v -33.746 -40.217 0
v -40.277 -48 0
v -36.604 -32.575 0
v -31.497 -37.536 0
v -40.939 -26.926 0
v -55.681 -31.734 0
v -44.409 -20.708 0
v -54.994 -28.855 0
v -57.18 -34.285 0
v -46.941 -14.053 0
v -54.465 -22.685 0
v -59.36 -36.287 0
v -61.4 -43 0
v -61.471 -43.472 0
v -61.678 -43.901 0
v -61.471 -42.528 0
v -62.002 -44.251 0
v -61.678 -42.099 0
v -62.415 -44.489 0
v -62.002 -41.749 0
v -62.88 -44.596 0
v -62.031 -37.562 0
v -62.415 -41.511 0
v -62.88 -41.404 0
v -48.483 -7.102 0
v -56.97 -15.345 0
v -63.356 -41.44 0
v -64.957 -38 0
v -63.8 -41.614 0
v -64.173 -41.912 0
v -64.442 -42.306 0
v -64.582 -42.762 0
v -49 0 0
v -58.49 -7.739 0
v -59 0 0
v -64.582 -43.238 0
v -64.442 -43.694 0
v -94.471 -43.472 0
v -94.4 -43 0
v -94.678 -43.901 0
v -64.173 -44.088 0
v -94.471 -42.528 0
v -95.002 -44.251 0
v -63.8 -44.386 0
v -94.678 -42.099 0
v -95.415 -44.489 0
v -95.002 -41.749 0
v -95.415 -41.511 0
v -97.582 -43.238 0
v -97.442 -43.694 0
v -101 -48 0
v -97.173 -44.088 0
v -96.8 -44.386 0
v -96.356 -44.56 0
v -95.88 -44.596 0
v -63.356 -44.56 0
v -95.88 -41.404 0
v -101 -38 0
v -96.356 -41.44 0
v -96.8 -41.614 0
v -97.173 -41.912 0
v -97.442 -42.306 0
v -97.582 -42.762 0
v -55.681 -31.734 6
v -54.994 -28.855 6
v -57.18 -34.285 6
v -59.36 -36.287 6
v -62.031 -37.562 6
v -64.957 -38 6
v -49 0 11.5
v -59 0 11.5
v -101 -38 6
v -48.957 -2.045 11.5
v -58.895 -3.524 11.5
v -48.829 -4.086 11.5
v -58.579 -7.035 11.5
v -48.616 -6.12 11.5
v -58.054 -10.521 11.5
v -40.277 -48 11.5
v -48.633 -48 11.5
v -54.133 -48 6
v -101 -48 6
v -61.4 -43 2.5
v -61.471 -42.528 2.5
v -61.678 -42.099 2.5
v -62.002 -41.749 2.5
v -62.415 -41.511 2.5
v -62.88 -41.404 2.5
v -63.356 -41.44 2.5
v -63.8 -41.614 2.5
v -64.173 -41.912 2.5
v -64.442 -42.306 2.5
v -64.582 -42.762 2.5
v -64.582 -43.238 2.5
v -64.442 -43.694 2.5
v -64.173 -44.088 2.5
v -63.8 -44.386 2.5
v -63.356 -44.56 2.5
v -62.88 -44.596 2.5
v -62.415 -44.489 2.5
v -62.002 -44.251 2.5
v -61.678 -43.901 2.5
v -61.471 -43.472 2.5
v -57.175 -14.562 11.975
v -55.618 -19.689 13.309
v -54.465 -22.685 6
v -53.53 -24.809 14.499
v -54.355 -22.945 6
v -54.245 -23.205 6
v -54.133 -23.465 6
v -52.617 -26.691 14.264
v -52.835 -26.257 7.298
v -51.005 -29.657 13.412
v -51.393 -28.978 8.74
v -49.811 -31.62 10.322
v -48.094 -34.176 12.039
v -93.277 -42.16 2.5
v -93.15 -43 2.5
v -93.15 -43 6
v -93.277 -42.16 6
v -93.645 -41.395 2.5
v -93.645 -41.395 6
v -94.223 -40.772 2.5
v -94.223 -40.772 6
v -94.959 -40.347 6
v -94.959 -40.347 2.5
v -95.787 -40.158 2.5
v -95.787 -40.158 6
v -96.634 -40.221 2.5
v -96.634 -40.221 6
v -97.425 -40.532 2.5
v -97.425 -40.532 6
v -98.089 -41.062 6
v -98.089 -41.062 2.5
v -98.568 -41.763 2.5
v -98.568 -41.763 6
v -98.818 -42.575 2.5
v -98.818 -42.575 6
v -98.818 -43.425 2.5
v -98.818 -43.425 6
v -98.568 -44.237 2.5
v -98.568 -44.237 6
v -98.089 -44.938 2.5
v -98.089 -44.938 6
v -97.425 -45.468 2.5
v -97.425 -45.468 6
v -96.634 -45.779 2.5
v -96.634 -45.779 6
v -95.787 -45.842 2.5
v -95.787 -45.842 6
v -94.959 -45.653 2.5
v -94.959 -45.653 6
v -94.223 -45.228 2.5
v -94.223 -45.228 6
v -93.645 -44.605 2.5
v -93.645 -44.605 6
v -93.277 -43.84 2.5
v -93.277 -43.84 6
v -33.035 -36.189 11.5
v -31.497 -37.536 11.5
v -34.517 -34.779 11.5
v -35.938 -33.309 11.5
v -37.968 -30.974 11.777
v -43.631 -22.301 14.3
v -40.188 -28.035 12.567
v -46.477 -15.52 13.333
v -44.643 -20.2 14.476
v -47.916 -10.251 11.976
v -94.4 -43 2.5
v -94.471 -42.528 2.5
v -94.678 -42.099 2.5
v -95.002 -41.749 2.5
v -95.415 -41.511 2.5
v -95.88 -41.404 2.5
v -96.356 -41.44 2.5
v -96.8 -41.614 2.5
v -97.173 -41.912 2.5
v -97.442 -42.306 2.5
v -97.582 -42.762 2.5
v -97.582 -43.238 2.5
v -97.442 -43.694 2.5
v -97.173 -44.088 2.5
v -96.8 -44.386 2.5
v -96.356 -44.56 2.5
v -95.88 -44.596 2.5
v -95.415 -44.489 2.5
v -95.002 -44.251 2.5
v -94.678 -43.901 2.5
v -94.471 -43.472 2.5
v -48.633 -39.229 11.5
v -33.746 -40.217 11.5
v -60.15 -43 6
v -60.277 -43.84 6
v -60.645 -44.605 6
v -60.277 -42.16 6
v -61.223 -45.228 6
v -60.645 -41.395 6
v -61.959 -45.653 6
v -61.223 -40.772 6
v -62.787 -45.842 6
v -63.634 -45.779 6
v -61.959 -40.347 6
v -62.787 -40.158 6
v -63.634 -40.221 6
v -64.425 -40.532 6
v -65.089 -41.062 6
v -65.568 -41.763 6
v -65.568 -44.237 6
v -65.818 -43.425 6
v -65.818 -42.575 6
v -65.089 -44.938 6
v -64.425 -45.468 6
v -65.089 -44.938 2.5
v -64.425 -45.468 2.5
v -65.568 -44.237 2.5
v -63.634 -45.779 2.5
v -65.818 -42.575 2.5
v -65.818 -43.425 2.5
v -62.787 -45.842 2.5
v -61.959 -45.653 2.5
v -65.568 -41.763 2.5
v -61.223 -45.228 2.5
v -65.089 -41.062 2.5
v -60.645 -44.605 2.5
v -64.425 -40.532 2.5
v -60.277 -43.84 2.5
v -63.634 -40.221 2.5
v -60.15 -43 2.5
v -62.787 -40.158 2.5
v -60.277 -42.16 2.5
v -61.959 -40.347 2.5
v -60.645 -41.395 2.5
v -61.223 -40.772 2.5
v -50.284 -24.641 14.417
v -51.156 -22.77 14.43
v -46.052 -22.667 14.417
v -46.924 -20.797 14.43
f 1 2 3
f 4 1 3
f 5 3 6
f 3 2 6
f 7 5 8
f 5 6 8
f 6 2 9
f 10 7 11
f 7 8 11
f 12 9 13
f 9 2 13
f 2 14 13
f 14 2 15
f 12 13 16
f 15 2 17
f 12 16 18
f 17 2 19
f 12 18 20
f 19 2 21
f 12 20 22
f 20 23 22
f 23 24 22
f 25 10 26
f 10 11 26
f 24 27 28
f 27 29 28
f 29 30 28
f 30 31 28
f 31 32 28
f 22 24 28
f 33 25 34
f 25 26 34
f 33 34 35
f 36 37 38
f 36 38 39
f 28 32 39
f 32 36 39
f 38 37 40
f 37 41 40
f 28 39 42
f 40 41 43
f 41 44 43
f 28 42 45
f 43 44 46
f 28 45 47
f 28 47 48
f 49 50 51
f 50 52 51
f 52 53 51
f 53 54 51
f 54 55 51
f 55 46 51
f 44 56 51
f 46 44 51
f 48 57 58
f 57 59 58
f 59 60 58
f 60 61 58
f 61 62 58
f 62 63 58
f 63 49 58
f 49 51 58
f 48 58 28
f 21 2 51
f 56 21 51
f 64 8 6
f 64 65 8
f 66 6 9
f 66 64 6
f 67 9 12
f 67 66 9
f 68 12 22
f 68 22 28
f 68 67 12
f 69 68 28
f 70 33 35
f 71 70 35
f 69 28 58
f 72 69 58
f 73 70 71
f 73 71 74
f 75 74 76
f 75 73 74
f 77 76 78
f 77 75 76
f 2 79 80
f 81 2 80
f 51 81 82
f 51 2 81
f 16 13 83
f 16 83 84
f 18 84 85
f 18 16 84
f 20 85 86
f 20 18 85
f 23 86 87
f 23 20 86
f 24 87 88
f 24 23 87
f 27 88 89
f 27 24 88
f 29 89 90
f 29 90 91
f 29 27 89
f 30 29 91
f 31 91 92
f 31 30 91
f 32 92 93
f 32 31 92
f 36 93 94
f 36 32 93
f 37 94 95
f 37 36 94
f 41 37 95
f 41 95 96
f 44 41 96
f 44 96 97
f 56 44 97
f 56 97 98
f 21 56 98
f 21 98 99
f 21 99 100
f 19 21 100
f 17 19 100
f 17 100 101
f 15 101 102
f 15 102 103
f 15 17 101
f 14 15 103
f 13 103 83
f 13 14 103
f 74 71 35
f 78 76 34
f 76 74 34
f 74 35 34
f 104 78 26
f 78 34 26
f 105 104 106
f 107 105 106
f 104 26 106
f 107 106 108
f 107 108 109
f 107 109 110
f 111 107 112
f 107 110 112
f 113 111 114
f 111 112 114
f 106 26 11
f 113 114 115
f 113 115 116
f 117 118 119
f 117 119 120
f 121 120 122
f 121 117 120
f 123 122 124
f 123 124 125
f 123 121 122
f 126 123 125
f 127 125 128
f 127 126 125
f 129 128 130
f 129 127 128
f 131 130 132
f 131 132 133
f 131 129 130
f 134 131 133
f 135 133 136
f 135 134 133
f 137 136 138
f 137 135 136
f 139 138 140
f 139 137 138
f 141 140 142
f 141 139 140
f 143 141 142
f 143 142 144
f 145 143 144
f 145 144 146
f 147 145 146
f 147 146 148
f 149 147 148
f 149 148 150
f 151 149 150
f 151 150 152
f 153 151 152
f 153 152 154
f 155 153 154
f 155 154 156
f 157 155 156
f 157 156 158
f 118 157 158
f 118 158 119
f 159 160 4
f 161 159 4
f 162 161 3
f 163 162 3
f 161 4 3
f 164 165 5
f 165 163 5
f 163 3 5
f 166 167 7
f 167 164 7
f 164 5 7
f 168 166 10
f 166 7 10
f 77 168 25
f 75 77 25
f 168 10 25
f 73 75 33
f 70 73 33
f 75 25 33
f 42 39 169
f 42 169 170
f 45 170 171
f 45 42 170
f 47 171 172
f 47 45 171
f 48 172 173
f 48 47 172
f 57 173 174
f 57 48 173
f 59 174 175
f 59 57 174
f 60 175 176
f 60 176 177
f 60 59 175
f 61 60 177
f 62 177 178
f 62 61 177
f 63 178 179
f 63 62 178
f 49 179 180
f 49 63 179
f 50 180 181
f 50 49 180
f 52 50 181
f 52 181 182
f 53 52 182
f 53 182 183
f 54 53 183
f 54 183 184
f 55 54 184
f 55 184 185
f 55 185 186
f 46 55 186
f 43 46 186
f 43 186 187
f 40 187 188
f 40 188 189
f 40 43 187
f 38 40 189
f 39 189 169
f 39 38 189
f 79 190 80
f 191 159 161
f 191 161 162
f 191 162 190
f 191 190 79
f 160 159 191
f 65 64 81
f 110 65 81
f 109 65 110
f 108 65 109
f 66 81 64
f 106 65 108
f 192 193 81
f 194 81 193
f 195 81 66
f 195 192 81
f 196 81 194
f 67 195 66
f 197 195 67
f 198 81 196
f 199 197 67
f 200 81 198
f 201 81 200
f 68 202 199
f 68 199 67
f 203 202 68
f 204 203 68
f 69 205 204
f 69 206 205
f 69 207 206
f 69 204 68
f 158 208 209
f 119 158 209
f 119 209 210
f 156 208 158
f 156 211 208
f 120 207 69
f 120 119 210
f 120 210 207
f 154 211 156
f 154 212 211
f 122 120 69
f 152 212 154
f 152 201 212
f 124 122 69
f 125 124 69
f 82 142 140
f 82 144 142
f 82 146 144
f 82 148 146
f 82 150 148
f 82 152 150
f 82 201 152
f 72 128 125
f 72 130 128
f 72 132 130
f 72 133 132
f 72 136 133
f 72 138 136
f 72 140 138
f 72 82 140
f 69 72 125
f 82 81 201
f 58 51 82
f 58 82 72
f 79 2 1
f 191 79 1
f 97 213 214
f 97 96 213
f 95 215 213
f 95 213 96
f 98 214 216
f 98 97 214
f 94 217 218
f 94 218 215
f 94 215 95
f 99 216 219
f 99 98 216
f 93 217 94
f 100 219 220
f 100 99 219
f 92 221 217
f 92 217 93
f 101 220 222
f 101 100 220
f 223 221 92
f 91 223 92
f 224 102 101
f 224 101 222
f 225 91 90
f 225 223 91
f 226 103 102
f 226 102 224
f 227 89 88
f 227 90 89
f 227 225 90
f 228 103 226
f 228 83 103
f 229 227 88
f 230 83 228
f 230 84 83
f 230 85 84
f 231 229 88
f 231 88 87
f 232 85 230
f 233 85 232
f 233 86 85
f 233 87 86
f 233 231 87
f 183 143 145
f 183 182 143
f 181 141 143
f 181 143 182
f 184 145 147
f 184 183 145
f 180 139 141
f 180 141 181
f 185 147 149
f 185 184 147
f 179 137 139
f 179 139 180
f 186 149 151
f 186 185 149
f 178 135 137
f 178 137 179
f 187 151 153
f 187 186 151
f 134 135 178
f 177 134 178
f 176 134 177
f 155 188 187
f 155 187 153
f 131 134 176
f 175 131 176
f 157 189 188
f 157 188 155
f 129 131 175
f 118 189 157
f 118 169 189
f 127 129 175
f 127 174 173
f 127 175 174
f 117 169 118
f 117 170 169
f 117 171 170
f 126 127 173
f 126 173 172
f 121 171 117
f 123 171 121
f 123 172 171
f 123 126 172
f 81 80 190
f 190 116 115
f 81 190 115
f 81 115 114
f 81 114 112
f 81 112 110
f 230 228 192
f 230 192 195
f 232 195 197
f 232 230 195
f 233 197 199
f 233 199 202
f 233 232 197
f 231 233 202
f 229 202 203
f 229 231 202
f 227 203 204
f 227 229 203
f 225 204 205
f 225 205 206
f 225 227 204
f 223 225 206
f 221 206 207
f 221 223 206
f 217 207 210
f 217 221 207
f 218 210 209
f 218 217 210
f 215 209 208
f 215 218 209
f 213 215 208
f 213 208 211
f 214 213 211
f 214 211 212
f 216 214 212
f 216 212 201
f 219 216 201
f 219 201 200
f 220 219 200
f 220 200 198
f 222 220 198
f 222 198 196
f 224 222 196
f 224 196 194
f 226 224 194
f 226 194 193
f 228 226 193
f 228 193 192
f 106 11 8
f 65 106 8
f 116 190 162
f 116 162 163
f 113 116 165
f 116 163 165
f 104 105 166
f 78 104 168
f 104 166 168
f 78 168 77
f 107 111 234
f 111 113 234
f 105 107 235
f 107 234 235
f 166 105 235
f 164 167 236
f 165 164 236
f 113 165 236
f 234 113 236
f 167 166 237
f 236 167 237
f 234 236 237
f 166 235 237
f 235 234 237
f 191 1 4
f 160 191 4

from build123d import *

# Parameters (mm, degrees)
BOSS_EXTRUDE1_DEPTH = 16
SKETCH1_3_W         = 10
SKETCH1_3_H         = 55.866863614
SKETCH1_3_R         = 2.85
BOSS_EXTRUDE2_DEPTH = 6
SKETCH1_4_R         = 2.85
SKETCH1_4_R_2       = 1.6
BOSS_EXTRUDE3_DEPTH = 2.5
CHAMFER3_SIZE       = 10.645574538
CHAMFER4_SIZE       = 9
CUT_EXTRUDE2_DEPTH  = 27.5
FILLET1_R           = 10


with BuildPart() as part:
    # Sketch1 → Boss-Extrude1 (new body)
    with BuildSketch(Plane(origin=(0, 0, 0), x_dir=(0, 1, 0), z_dir=(0, 0, 1))):
        with BuildLine():
            Line((-40.217333264, 33.746349509), (-37.536177713, 31.496592875))
            ThreePointArc((-37.536177713, 31.496592875), (-20.708294825, 44.409081565), (0, 49))
            Line((0, 49), (0, 52.5))
            Line((0, 52.5), (0, 59))
            ThreePointArc((0, 59), (-20.225540206, 55.42497202), (-38, 45.133136386))
            Line((-38, 45.133136386), (-48, 45.133136386))
            Line((-48, 45.133136386), (-48, 40.276782297))
            Line((-48, 40.276782297), (-40.217333264, 33.746349509))
        make_face()
    extrude(amount=BOSS_EXTRUDE1_DEPTH)

    # Sketch1<3> → Boss-Extrude2 (add)
    with BuildSketch(Plane(origin=(0, 0, 0), x_dir=(0, 1, 0), z_dir=(0, 0, 1))):
        with Locations((-43, 73.066568193)):
            Rectangle(SKETCH1_3_W, SKETCH1_3_H)
        with Locations(Location((-43, 96, 0), (0, 0, 270))):
            Circle(SKETCH1_3_R, mode=Mode.SUBTRACT)
        with Locations(Location((-43, 63, 0), (0, 0, 270))):
            Circle(SKETCH1_3_R, mode=Mode.SUBTRACT)
    extrude(amount=BOSS_EXTRUDE2_DEPTH)

    # Sketch1<4> → Boss-Extrude3 (add)
    # profile 1 of 2: a face of its own
    with BuildSketch(Plane(origin=(0, 0, 0), x_dir=(0, 1, 0), z_dir=(0, 0, 1))):
        with Locations(Location((-43, 96, 0), (0, 0, 270))):
            Circle(SKETCH1_4_R)
        with Locations(Location((-43, 96, 0), (0, 0, 270))):
            Circle(SKETCH1_4_R_2, mode=Mode.SUBTRACT)
    # profile 2 of 2: a face of its own
    with BuildSketch(Plane(origin=(0, 0, 0), x_dir=(0, 1, 0), z_dir=(0, 0, 1))):
        with Locations(Location((-43, 63, 0), (0, 0, 270))):
            Circle(SKETCH1_4_R)
        with Locations(Location((-43, 63, 0), (0, 0, 270))):
            Circle(SKETCH1_4_R_2, mode=Mode.SUBTRACT)
    extrude(amount=BOSS_EXTRUDE3_DEPTH)

    # Chamfer3
    # the kernel refuses this chamfer: 15, 10.645574538 mm, written as the material it adds along each edge
    with BuildSketch(Plane(origin=(-45.133136386, -38, 0), x_dir=(-0.520323475299402, 0.8539692506480269, 0), z_dir=(0, 0, 1))) as chamfer3_piece_1_section:
        with BuildLine():
            Line((17.934002299, 0), (CHAMFER3_SIZE * 0.520323475317, CHAMFER3_SIZE * 0.853969250677))
            Line((CHAMFER3_SIZE * 0.520323475317, CHAMFER3_SIZE * 0.853969250677), (0, 0))
            ThreePointArc((0, 0), (9.212497423, 0.684886528), (17.934002299, 0))
        make_face()
    chamfer3_piece_1 = extrude(amount=6, mode=Mode.PRIVATE)
    chamfer3_piece_1 = split(chamfer3_piece_1, bisect_by=Plane(origin=(-45.133136386, -38, 0), z_dir=(-1, 0, 0)), keep=Keep.TOP, mode=Mode.PRIVATE)
    add(chamfer3_piece_1)

    # Chamfer4
    chamfer4_edges = [part.edges().sort_by_distance(p)[0] for p in [
        (-45.133136386, -43, 6),
    ]]
    chamfer(chamfer4_edges, length=CHAMFER4_SIZE)

    # Sketch3 → Cut-Extrude2 (cut)
    with BuildSketch(Plane(origin=(-40.248296437, -18.768088856, 0), x_dir=(0, 0, -1), z_dir=(0.9063077870366554, 0.42261826174068795, 0))):
        with BuildLine():
            Line((-11.5, -15), (-11.5, -26.481070055))
            Line((-11.5, -26.481070055), (-21.940266499, -26.481070055))
            Line((-21.940266499, -26.481070055), (-21.940266499, 24.934477443))
            Line((-21.940266499, 24.934477443), (-11.5, 24.934477443))
            Line((-11.5, 24.934477443), (-11.5, 15))
            add(Edge.make_bspline(
                [(-11.5, -15), (-11.5, -10.5), (-14.436309762, -3.235504373), (-14.602449576, 2.674959083), (-11.5, 10.5), (-11.5, 15)],
                knots=[0, 0, 0, 0, 0.483457159, 0.583457159, 1, 1, 1, 1], degree=3))
        make_face()
    extrude(amount=-CUT_EXTRUDE2_DEPTH, mode=Mode.SUBTRACT)

    # Fillet1
    fillet1_edges = [part.edges().sort_by_distance(p)[0] for p in [
        (-55.778710924, -38, 3),
    ]]
    fillet(fillet1_edges, radius=FILLET1_R)


solid = part.part
